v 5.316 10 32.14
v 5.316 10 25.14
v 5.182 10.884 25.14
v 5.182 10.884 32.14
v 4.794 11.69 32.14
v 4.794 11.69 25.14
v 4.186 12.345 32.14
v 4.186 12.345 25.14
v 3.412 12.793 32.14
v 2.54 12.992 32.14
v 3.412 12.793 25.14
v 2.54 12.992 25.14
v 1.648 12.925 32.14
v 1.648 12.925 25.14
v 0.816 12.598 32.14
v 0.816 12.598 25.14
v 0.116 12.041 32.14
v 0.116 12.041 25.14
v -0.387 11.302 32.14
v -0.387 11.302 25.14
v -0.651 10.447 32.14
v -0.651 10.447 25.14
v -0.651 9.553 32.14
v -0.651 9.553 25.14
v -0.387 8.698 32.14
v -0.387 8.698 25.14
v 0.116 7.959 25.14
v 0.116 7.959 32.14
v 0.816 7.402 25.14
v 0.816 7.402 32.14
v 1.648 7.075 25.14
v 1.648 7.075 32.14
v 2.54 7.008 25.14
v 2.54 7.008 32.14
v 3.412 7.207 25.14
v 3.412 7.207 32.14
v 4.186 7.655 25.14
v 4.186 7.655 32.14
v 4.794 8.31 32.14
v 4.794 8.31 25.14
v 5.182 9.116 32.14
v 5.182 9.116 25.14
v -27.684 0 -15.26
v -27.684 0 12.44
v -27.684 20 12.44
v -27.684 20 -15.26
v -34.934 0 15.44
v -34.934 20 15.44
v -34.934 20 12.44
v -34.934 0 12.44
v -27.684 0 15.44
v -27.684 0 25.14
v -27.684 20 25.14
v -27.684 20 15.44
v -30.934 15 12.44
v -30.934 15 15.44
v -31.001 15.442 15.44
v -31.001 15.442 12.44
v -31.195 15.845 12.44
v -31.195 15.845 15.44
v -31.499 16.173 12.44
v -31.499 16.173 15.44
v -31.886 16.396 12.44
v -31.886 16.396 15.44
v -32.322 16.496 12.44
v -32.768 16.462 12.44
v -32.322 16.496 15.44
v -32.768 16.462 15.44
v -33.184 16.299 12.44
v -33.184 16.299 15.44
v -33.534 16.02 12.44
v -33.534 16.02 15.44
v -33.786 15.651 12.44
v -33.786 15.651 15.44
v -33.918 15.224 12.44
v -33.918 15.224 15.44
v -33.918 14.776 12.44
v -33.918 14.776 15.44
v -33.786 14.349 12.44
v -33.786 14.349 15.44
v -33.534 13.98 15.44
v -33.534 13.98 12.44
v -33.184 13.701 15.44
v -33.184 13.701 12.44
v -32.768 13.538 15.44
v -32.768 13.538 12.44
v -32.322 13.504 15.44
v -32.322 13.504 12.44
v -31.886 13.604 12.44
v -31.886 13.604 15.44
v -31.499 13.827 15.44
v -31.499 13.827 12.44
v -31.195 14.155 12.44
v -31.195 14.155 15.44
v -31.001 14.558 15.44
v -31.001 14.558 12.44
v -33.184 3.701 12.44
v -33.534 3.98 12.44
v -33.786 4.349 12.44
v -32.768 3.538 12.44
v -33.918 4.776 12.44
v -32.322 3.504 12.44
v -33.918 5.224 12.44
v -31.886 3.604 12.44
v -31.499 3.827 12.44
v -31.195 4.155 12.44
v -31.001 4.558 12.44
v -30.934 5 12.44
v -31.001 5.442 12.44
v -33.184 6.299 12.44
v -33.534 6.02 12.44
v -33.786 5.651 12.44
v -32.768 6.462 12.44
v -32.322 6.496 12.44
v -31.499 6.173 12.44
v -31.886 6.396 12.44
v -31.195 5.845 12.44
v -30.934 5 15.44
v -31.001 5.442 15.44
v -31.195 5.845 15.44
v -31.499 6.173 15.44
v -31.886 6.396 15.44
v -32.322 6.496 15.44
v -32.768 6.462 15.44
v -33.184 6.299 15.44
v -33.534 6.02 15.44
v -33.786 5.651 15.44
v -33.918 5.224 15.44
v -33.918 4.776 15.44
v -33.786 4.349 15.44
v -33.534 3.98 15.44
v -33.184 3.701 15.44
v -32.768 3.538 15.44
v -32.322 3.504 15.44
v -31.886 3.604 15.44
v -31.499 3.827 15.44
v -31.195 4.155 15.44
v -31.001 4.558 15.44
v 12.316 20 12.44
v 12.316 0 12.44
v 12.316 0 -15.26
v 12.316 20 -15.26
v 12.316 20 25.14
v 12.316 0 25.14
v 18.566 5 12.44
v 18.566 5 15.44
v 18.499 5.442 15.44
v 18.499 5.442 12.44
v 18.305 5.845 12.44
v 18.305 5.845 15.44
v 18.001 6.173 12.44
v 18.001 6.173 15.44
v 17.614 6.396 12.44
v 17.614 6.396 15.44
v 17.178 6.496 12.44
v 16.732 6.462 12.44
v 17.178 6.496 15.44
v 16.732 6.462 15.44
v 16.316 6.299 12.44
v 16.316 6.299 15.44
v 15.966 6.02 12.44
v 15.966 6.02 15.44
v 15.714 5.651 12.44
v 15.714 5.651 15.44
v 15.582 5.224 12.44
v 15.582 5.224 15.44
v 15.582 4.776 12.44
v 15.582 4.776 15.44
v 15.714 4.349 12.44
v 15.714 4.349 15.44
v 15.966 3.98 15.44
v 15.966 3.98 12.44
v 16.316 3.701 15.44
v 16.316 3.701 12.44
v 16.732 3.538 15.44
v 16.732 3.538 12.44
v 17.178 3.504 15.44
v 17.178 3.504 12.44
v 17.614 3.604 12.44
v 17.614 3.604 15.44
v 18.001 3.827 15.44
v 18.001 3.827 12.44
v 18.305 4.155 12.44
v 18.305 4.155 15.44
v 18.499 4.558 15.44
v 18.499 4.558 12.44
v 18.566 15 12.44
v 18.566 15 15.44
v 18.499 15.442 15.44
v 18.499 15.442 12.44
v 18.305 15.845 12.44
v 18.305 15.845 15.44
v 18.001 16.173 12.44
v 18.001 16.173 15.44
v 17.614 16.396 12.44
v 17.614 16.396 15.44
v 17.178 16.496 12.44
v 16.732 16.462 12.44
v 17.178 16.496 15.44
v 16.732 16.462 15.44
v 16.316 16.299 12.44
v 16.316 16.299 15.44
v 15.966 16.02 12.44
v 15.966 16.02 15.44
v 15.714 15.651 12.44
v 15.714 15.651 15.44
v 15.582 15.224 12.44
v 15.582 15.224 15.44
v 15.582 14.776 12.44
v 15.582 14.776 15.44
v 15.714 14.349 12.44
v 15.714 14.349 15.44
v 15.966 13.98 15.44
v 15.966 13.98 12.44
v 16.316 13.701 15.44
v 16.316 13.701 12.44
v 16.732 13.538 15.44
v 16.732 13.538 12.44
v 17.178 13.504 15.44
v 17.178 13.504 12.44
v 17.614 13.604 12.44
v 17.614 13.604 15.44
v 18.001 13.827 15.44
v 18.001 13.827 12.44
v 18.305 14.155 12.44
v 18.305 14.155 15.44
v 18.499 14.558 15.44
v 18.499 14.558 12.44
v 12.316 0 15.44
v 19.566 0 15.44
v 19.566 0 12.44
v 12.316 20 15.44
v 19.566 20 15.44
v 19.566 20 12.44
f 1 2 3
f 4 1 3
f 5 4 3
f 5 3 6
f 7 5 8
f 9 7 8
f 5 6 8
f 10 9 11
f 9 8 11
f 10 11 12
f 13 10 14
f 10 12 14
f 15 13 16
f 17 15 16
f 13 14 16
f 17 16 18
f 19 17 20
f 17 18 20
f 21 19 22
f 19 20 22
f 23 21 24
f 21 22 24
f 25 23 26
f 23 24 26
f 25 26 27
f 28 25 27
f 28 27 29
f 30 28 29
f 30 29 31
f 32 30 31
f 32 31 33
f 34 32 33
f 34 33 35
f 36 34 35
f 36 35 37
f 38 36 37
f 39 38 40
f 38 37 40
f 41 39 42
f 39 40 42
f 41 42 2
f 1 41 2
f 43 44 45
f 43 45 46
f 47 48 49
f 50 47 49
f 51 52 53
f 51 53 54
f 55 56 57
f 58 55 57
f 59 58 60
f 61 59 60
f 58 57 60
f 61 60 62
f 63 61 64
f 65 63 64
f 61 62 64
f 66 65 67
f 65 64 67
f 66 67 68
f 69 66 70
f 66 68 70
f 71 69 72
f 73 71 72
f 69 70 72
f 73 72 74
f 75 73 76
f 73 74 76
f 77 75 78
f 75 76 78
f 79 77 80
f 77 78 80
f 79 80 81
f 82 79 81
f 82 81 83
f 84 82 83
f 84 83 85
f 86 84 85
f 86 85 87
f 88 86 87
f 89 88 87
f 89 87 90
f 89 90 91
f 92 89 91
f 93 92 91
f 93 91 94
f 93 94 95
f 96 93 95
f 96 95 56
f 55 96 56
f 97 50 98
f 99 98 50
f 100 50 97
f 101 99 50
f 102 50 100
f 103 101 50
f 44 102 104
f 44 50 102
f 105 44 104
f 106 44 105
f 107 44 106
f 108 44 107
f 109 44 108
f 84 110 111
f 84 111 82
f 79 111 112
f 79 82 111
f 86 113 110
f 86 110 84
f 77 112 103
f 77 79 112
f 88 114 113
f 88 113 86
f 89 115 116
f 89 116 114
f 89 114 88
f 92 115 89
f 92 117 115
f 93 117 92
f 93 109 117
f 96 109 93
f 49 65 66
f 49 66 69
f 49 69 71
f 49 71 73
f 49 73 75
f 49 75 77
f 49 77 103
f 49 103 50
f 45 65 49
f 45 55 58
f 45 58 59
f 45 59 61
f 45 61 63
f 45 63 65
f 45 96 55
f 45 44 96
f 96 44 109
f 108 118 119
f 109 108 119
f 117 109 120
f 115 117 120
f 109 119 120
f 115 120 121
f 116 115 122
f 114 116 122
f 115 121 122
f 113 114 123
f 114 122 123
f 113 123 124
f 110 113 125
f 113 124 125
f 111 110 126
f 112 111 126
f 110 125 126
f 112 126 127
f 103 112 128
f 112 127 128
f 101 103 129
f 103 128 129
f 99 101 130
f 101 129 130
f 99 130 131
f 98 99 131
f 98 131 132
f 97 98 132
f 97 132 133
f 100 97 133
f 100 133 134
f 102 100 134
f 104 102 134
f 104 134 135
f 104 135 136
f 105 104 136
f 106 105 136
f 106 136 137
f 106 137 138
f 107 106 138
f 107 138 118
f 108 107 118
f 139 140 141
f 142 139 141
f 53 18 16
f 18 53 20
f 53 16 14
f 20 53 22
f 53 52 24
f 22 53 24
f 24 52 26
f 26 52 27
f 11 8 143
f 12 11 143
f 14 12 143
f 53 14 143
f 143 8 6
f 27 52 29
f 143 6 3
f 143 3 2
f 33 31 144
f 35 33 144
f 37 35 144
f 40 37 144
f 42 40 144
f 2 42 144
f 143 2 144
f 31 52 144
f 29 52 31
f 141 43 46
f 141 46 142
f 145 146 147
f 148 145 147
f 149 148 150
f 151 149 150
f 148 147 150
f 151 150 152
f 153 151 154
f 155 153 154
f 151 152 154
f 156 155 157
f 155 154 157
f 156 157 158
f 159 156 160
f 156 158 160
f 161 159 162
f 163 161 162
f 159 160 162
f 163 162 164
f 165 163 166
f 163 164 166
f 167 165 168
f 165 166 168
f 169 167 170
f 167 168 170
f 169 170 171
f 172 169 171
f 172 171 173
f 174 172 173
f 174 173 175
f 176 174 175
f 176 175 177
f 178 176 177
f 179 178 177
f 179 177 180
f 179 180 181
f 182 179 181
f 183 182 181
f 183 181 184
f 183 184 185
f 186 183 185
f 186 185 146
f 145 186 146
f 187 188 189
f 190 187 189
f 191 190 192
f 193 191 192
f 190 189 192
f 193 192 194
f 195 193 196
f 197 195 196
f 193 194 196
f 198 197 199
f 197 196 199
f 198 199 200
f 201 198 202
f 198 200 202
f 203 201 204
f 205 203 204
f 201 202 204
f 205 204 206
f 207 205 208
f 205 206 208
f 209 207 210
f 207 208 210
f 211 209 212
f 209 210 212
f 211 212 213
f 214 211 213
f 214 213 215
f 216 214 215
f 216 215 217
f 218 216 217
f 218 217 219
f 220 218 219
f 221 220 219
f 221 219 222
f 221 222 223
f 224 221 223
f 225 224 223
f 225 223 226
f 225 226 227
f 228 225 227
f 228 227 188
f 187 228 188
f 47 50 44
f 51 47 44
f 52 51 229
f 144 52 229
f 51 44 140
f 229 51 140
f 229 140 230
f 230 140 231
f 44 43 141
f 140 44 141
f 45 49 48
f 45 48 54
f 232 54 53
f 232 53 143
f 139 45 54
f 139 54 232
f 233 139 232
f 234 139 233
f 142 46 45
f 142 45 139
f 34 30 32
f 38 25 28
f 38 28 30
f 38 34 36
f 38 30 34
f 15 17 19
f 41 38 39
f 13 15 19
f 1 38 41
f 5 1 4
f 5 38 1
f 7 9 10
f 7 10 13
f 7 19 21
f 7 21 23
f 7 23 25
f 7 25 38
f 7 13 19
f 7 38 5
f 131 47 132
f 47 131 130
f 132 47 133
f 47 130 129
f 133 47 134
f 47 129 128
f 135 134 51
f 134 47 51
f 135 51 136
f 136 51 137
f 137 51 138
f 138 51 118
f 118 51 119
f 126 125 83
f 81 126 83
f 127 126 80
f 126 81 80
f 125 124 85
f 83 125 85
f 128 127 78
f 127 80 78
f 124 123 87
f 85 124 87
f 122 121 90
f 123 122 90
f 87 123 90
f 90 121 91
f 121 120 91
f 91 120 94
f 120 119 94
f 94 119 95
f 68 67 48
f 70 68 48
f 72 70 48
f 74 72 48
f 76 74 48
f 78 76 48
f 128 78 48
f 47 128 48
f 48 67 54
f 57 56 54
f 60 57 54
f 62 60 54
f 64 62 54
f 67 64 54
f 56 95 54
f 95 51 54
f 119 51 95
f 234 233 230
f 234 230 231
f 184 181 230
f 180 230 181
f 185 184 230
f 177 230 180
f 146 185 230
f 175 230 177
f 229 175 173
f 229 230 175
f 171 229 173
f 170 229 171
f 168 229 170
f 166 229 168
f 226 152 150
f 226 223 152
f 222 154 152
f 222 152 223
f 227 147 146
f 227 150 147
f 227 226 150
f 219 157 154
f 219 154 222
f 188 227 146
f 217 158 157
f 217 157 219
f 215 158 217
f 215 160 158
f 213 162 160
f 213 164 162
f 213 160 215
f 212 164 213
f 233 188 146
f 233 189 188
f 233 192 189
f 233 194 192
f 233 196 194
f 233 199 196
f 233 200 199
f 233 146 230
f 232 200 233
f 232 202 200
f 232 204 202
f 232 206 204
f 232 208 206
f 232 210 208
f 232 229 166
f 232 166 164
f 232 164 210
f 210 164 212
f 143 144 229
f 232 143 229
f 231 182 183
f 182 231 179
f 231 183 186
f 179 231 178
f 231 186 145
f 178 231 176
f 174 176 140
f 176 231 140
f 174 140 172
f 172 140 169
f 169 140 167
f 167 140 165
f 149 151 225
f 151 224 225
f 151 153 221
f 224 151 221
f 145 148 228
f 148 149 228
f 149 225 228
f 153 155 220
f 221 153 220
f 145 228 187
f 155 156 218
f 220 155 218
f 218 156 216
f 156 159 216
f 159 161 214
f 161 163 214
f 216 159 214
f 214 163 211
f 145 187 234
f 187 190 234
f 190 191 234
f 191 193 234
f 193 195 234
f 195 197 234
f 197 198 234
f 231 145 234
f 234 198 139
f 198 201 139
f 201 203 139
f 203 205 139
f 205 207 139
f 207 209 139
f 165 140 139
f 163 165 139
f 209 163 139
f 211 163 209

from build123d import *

# Parameters (mm, degrees)
SKETCH1_W           = 40
SKETCH1_H           = 40.4
BOSS_EXTRUDE1_DEPTH = 20
SKETCH3_W           = 3
SKETCH3_H           = 20
BOSS_EXTRUDE2_DEPTH = 7.25
SKETCH5_R           = 1.5
CUT_EXTRUDE1_DEPTH  = 7.25
SKETCH6_R           = 3
BOSS_EXTRUDE3_DEPTH = 7


with BuildPart() as part:
    # Sketch1 → Boss-Extrude1 (new body)
    with BuildSketch(Plane(origin=(0, 0, 0), x_dir=(1, 0, 0), z_dir=(0, 1, 0))):
        with Locations((-7.684478372, -4.939949109)):
            Rectangle(SKETCH1_W, SKETCH1_H)
    extrude(amount=BOSS_EXTRUDE1_DEPTH)

    # Sketch3 → Boss-Extrude2 (add)
    with BuildSketch(Plane(origin=(12.315521628, 0, 0), x_dir=(0, 0, -1), z_dir=(1, 0, 0))):
        with Locations((-13.939949109, 10)):
            Rectangle(SKETCH3_W, SKETCH3_H)
    boss_extrude2 = extrude(amount=BOSS_EXTRUDE2_DEPTH)

    # Mirror1: Boss-Extrude2 across plane
    add(boss_extrude2.mirror(Plane.ZY.offset(7.684478372)))

    # Sketch5 → Cut-Extrude1 (cut)
    with BuildSketch(Plane.XY.offset(15.439949109)):
        with Locations((17.065521628, 15)):
            Circle(SKETCH5_R)
        with Locations((17.065521628, 5)):
            Circle(SKETCH5_R)
        with Locations((-32.434478372, 15)):
            Circle(SKETCH5_R)
        with Locations((-32.434478372, 5)):
            Circle(SKETCH5_R)
    extrude(amount=-CUT_EXTRUDE1_DEPTH, mode=Mode.SUBTRACT)

    # Sketch6 → Boss-Extrude3 (add)
    with BuildSketch(Plane.XY.offset(25.139949109)):
        with Locations((2.315521628, 10)):
            Circle(SKETCH6_R)
    extrude(amount=BOSS_EXTRUDE3_DEPTH)


solid = part.part
